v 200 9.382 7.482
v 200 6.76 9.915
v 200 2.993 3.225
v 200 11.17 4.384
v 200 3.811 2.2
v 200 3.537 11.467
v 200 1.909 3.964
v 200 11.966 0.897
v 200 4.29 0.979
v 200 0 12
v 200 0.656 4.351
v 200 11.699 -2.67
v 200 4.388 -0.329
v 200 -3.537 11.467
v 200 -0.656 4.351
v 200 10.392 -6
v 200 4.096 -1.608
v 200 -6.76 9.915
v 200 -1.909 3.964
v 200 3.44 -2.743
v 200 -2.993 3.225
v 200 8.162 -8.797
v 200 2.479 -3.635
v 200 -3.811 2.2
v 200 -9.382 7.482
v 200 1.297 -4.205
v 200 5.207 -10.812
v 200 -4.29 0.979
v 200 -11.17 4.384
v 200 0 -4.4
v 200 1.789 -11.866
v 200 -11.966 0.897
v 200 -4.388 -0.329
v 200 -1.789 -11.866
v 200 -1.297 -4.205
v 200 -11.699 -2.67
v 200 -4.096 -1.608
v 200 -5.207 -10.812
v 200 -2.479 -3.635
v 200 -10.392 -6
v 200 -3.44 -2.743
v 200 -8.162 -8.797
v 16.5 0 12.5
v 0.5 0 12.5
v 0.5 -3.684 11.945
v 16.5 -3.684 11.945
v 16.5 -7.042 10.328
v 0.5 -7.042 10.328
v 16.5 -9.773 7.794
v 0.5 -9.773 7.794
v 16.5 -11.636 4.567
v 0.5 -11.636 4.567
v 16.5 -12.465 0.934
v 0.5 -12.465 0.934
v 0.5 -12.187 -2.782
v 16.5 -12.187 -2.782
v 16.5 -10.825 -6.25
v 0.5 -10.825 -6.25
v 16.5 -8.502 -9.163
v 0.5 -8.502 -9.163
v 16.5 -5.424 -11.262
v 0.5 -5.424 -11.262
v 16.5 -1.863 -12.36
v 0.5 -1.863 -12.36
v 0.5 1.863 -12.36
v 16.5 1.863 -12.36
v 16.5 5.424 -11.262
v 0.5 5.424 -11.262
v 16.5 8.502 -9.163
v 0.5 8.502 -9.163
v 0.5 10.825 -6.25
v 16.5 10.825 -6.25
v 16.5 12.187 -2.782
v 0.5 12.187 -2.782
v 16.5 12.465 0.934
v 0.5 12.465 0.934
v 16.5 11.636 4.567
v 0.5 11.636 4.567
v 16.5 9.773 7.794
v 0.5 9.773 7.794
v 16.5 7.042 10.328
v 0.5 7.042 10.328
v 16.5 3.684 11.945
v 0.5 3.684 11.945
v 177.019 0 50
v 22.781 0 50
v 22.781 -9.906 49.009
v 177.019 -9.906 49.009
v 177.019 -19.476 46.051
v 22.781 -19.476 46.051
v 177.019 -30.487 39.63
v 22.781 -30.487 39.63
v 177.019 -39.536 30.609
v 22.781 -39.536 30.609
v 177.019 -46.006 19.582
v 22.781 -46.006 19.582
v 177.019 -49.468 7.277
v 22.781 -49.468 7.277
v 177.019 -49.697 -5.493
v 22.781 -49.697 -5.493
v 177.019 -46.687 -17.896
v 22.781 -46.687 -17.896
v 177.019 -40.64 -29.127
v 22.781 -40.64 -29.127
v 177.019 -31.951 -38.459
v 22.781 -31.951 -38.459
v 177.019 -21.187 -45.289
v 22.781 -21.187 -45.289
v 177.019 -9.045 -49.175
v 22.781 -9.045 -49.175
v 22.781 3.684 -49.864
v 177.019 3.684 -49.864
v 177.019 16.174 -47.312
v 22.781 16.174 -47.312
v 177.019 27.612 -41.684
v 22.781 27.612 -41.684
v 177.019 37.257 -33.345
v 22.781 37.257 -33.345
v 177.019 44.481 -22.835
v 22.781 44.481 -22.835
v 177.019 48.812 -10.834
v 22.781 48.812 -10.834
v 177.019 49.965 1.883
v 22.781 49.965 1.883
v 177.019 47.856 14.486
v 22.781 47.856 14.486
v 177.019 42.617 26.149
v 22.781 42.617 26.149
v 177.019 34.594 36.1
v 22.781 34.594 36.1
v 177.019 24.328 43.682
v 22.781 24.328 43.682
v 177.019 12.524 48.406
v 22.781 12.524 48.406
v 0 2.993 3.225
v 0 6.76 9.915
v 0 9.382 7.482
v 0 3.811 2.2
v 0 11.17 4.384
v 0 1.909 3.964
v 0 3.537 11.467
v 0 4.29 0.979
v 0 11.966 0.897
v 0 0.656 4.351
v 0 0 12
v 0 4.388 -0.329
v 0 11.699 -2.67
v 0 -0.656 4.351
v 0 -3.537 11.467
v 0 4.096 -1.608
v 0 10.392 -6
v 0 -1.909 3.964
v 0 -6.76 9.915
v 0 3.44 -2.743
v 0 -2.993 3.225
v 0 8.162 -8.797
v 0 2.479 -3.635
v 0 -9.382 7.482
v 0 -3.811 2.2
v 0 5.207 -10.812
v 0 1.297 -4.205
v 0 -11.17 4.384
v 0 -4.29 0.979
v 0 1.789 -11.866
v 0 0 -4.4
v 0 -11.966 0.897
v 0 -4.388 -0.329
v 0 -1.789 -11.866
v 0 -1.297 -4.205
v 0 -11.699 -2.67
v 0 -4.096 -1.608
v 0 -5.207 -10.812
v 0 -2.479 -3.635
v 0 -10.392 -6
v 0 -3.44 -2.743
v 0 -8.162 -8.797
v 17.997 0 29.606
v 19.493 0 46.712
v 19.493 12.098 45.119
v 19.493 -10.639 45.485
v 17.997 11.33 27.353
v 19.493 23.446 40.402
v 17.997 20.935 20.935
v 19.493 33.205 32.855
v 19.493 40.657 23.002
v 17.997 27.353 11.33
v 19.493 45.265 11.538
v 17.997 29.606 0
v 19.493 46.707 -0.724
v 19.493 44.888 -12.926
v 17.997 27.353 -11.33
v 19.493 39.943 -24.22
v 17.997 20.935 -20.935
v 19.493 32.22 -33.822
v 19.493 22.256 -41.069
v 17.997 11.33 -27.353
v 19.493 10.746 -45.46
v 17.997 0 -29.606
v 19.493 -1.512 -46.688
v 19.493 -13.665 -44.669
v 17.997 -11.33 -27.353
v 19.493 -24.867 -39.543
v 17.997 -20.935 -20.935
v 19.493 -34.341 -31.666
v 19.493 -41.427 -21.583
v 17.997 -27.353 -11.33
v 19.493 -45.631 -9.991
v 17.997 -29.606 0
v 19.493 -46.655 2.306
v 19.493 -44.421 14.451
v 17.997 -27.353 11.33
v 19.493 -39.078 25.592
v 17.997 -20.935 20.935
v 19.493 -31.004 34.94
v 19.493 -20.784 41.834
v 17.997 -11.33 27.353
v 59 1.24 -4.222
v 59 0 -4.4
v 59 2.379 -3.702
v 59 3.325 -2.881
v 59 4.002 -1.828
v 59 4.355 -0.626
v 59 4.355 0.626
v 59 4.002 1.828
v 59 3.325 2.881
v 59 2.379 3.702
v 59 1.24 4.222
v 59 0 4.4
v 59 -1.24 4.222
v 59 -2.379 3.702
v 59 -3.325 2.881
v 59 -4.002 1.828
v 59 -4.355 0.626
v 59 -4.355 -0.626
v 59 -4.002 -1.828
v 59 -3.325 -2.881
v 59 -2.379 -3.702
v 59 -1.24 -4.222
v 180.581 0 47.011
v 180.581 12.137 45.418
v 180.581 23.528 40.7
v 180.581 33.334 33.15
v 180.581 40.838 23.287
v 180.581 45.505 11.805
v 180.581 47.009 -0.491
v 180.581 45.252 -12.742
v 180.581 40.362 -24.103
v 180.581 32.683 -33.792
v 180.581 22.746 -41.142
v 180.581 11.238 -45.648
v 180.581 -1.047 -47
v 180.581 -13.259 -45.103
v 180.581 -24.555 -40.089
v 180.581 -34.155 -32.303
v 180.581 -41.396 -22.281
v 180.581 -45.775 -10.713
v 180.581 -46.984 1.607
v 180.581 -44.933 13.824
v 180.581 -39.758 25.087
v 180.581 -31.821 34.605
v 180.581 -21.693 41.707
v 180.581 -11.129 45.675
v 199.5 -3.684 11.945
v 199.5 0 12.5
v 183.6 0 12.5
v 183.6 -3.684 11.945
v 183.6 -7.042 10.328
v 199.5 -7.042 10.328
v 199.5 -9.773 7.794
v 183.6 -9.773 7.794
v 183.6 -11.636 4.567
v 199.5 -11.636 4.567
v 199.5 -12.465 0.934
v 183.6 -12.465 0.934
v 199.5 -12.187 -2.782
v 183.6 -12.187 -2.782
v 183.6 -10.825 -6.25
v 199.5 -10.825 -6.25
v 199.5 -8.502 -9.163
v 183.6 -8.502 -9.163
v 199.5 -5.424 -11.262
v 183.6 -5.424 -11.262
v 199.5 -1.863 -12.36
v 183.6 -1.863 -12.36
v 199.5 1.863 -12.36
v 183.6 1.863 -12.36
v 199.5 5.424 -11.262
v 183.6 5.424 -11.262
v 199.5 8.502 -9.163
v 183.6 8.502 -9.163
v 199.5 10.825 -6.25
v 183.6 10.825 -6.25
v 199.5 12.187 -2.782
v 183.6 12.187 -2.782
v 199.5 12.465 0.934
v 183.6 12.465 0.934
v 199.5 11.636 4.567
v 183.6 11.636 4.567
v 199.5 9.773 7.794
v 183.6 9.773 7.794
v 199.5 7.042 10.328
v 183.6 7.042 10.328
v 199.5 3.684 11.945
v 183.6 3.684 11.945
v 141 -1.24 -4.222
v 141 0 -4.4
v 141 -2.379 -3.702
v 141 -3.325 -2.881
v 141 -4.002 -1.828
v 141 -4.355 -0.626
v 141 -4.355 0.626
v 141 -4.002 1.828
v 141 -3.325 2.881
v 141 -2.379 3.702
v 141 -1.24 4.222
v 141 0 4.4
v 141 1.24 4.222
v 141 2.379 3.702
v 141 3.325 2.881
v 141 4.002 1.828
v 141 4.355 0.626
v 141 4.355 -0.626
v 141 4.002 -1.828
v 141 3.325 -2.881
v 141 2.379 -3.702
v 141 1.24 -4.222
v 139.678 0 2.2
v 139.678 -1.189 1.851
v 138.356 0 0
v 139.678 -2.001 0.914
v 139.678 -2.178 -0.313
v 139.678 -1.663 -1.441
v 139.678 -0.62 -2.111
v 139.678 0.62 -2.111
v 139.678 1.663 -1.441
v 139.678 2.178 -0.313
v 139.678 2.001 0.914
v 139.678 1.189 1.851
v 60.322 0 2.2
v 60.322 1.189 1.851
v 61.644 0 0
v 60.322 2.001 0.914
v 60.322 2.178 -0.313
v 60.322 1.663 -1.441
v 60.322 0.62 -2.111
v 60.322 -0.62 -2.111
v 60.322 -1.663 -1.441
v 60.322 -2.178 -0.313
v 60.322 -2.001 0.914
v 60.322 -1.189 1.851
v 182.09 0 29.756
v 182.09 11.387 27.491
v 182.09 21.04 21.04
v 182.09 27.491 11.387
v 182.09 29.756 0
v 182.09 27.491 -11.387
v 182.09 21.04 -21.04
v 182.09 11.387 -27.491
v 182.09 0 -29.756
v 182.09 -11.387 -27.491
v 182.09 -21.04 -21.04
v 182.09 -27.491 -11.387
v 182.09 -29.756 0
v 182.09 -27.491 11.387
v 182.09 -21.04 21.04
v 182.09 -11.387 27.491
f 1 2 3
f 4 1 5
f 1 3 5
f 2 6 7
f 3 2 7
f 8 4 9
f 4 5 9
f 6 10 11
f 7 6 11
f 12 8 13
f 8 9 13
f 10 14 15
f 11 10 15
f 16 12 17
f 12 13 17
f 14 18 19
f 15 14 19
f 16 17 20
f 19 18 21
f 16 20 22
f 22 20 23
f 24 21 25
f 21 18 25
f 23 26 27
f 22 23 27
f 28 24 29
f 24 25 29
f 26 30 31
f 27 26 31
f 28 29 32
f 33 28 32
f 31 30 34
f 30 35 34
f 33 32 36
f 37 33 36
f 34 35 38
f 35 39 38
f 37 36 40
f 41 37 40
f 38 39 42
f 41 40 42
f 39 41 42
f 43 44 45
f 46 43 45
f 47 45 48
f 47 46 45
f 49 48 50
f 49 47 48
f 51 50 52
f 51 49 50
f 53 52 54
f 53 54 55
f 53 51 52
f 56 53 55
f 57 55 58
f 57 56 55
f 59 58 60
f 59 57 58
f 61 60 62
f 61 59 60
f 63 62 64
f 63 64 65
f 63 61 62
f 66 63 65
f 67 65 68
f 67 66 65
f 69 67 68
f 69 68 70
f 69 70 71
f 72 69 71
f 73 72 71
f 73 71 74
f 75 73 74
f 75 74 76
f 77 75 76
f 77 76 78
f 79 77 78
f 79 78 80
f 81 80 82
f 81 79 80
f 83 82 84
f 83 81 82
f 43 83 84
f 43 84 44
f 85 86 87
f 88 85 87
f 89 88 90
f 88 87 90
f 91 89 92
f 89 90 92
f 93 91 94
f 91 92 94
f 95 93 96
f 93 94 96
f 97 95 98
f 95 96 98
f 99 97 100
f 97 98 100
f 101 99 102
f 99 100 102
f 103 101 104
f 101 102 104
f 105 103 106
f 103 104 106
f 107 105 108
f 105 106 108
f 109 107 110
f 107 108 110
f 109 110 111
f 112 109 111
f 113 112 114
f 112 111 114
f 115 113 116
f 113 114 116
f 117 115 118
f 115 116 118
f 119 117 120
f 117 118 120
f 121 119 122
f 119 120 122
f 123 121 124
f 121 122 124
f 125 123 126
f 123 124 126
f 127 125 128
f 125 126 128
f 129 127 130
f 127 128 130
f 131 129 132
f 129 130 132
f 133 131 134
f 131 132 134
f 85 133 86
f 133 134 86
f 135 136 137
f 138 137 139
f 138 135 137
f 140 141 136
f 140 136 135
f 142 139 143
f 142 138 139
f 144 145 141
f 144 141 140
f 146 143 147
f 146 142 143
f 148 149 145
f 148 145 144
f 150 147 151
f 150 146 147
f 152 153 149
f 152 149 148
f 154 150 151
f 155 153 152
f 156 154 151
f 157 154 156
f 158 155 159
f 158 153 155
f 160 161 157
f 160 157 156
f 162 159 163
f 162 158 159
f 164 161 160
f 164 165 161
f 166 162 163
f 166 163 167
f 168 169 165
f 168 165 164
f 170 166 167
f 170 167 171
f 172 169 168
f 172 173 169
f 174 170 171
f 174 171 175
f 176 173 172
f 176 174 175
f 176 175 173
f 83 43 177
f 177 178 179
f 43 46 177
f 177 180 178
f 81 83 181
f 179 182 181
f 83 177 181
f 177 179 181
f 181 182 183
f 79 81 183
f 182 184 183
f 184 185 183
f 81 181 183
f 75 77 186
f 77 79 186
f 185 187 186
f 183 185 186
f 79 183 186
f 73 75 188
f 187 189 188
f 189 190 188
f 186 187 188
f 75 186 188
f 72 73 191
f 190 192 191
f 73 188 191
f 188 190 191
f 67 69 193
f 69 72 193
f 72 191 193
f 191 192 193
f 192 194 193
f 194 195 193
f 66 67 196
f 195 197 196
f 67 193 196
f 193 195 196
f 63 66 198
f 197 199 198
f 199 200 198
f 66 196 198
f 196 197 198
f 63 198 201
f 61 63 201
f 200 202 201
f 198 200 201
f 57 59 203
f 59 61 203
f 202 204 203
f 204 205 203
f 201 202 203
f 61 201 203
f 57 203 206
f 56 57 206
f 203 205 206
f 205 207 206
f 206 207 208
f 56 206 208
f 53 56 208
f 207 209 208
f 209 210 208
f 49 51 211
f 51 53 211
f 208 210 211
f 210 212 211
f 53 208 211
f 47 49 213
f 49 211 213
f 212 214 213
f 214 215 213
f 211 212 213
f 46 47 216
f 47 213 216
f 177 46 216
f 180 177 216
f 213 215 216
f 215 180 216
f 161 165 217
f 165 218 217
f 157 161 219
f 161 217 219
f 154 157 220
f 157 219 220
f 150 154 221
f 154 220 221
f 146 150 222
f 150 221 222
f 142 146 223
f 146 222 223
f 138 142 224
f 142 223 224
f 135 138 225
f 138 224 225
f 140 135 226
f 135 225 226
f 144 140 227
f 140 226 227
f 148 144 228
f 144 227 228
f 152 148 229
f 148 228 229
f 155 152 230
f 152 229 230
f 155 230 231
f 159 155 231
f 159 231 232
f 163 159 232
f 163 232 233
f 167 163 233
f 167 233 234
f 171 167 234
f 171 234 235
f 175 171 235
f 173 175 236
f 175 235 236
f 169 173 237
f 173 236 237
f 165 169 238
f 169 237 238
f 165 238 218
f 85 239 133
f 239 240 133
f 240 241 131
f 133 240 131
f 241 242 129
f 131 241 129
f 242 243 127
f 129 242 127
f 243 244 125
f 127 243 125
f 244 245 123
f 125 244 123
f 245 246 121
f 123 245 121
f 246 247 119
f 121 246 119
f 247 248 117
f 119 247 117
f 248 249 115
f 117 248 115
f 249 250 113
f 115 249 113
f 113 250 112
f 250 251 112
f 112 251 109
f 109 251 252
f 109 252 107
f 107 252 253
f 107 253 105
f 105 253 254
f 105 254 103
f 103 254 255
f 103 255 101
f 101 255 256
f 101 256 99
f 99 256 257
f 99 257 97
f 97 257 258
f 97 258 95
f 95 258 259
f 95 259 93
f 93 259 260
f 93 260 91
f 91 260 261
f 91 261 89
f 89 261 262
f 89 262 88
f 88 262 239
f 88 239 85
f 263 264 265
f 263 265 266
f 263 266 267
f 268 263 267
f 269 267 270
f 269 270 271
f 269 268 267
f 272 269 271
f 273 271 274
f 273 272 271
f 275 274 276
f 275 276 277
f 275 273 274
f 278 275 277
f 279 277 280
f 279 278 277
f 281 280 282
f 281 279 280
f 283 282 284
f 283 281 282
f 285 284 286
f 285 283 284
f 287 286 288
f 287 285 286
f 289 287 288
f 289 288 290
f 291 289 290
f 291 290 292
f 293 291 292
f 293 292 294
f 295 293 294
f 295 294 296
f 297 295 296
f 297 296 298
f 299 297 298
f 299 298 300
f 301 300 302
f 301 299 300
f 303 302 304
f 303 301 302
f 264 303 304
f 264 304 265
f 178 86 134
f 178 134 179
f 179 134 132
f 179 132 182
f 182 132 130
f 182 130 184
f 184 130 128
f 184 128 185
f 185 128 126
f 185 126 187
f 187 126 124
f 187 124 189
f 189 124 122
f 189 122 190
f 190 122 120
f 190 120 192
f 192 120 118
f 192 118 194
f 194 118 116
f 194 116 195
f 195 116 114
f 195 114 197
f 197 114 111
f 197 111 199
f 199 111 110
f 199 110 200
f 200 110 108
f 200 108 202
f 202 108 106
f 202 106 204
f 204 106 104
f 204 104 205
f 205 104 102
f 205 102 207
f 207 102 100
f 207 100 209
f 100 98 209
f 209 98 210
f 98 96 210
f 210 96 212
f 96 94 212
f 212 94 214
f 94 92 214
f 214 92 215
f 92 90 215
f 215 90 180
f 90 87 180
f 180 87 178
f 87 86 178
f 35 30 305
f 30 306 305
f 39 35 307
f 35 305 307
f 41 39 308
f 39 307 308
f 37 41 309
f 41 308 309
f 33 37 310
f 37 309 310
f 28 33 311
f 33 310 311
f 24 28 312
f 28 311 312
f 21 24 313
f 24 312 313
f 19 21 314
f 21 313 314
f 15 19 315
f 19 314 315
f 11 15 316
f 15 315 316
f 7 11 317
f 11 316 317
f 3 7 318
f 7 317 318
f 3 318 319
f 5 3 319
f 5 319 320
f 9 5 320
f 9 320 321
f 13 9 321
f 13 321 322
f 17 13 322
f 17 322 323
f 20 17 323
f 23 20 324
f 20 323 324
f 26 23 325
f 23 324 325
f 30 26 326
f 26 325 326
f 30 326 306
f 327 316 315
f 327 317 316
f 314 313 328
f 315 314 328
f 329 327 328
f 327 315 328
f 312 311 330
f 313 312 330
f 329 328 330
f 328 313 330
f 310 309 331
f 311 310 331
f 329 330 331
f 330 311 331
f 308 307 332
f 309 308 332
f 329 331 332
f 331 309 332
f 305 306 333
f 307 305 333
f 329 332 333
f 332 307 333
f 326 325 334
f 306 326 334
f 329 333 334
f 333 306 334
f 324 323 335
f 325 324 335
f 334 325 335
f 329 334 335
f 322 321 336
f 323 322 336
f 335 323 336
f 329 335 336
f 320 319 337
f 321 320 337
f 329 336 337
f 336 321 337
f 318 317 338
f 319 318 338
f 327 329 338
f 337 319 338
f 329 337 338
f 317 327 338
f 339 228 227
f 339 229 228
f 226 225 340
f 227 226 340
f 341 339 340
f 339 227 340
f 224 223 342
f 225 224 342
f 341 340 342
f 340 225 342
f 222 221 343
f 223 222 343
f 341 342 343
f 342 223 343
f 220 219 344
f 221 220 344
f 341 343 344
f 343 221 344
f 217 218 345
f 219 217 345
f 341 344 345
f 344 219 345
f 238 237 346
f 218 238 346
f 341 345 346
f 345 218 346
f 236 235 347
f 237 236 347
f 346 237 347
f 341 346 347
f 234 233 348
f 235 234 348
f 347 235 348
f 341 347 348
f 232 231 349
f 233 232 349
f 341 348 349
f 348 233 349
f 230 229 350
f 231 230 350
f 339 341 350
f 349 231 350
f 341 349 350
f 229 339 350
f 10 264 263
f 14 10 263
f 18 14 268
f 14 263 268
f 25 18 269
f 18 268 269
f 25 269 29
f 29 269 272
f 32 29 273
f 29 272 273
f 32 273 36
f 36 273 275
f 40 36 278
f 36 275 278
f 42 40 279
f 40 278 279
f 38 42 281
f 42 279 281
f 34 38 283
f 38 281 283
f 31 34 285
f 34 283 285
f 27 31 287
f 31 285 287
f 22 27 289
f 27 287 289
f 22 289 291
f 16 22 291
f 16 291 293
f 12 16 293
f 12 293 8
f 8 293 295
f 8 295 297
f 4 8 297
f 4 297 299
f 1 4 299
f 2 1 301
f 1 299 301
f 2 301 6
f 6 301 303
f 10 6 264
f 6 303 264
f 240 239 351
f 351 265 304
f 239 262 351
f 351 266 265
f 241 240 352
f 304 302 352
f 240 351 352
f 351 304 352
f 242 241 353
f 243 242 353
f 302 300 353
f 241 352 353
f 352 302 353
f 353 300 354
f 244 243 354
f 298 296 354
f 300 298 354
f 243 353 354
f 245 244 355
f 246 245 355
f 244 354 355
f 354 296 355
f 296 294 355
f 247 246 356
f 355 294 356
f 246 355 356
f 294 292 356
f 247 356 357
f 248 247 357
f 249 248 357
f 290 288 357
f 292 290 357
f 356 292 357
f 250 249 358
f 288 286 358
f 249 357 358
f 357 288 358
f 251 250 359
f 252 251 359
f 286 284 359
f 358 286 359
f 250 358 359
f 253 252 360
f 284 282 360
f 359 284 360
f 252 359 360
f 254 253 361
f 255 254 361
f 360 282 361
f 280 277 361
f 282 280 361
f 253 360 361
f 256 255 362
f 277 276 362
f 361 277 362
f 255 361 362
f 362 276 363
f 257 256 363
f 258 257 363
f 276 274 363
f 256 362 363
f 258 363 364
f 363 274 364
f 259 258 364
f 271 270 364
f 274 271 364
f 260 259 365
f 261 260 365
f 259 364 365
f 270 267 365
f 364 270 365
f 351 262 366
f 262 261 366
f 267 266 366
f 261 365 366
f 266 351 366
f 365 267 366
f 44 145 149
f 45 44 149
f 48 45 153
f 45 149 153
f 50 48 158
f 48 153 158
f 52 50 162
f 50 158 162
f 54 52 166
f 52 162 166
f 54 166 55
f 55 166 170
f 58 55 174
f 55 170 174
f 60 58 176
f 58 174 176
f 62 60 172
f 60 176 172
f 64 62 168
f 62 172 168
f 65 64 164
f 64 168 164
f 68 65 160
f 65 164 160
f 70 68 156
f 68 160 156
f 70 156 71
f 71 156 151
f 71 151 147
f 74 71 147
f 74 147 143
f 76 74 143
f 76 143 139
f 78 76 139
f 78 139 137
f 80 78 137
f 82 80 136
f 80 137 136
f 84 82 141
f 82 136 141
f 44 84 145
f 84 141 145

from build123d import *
from OCP.BRepFilletAPI import BRepFilletAPI_MakeChamfer

# Parameters (mm, degrees)
SKETCH_1_W       = 16.4
SKETCH_1_H       = 12.5
SKETCH_1_W_2     = 16.5
CHAMFER_1_SIZE   = 0.5
CHAMFER_2_SIZE   = 3
CHAMFER_2_SIZE2  = 3.300188603
M10X1_25_1_D     = 8.8
M10X1_25_1_DEPTH = 59
M10X1_25_1_TIP   = 2.643786724
M10X1_25_2_D     = 8.8
M10X1_25_2_DEPTH = 59
M10X1_25_2_TIP   = 2.643786724


with BuildPart() as part:
    # 草圖1 → 旋轉1 (revolve)
    with BuildSketch(Plane.XY, mode=Mode.PRIVATE) as revolve_1_sk:
        Polygon((16.5, 12.5), (16.5, 0), (183.6, 0), (183.6, 12.5), (183.6, 50), (16.5, 50), align=None)
        with Locations((191.8, 6.25)):
            Rectangle(SKETCH_1_W, SKETCH_1_H)
        with Locations((8.25, 6.25)):
            Rectangle(SKETCH_1_W_2, SKETCH_1_H)
    revolve(revolve_1_sk.sketch.rotate(Axis((16.5, 0, 0), (1, 0, 0)), 90), axis=Axis((16.5, 0, 0), (1, 0, 0)))

    # 草圖2 → 除料-旋轉1 (revolve, cut)
    with BuildSketch(Plane.XY, mode=Mode.PRIVATE) as cut_revolve_1_sk:
        Polygon((186.873055919, 74.843370729), (1.025224849, 63.173855755), (0, 12.5), (16.5, 12.5), (20.558049953, 58.883723216), (178.981866404, 65.285508546), (183.6, 12.5), (200, 12.5), align=None)
    revolve(cut_revolve_1_sk.sketch.rotate(Axis((0, 0, 0), (-1, 0, 0)), 270), axis=Axis((0, 0, 0), (-1, 0, 0)), mode=Mode.SUBTRACT)

    # 導角1
    chamfer_1_edges = [part.edges().sort_by_distance(p)[0] for p in [
        (200, 0, -12.5),
        (0, 0, -12.5),
    ]]
    chamfer(chamfer_1_edges, length=CHAMFER_1_SIZE)

    # 導角2: one chamfer whose edges measure the first distance from different faces: ONE call of the kernel's chamfer builder (chamfer() names one face for all edges)
    chamfer_2_edges_1 = [part.edges().sort_by_distance(p)[0] for p in [
        (19.780824882, 0, -50),
    ]]
    chamfer_2_side_1 = [part.faces().sort_by_distance(p)[0] for p in [
        (100.05, 0, -50),
    ]]
    chamfer_2_edges_2 = [part.edges().sort_by_distance(p)[0] for p in [
        (180.319175118, 0, -50),
    ]]
    chamfer_2_side_2 = [part.faces().sort_by_distance(p)[0] for p in [
        (181.959587559, 0, -31.25),
    ]]
    chamfer_2 = BRepFilletAPI_MakeChamfer(part.part.solid().wrapped)
    for e in chamfer_2_edges_1:
        chamfer_2.Add(CHAMFER_2_SIZE, CHAMFER_2_SIZE2, e.wrapped, chamfer_2_side_1[0].wrapped)  # the first distance lies on this face
    for e in chamfer_2_edges_2:
        chamfer_2.Add(CHAMFER_2_SIZE, CHAMFER_2_SIZE2, e.wrapped, chamfer_2_side_2[0].wrapped)  # the first distance lies on this face
    add(Compound.cast(chamfer_2.Shape()), mode=Mode.REPLACE)

    # M10x1.25 螺紋孔1
    with Locations(Plane(origin=(200, 0, 0), x_dir=(0, 0, 1), z_dir=(1, 0, 0))):
        with Locations((0, 0)):
            Hole(M10X1_25_1_D / 2, depth=M10X1_25_1_DEPTH)
            with Locations((0, 0, -(M10X1_25_1_DEPTH + M10X1_25_1_TIP / 2))):  # 118° drill point
                Cone(0, M10X1_25_1_D / 2, M10X1_25_1_TIP, mode=Mode.SUBTRACT)

    # M10x1.25 螺紋孔2
    with Locations(Plane.ZY):
        with Locations((0, 0)):
            Hole(M10X1_25_2_D / 2, depth=M10X1_25_2_DEPTH)
            with Locations((0, 0, -(M10X1_25_2_DEPTH + M10X1_25_2_TIP / 2))):  # 118° drill point
                Cone(0, M10X1_25_2_D / 2, M10X1_25_2_TIP, mode=Mode.SUBTRACT)


solid = part.part
